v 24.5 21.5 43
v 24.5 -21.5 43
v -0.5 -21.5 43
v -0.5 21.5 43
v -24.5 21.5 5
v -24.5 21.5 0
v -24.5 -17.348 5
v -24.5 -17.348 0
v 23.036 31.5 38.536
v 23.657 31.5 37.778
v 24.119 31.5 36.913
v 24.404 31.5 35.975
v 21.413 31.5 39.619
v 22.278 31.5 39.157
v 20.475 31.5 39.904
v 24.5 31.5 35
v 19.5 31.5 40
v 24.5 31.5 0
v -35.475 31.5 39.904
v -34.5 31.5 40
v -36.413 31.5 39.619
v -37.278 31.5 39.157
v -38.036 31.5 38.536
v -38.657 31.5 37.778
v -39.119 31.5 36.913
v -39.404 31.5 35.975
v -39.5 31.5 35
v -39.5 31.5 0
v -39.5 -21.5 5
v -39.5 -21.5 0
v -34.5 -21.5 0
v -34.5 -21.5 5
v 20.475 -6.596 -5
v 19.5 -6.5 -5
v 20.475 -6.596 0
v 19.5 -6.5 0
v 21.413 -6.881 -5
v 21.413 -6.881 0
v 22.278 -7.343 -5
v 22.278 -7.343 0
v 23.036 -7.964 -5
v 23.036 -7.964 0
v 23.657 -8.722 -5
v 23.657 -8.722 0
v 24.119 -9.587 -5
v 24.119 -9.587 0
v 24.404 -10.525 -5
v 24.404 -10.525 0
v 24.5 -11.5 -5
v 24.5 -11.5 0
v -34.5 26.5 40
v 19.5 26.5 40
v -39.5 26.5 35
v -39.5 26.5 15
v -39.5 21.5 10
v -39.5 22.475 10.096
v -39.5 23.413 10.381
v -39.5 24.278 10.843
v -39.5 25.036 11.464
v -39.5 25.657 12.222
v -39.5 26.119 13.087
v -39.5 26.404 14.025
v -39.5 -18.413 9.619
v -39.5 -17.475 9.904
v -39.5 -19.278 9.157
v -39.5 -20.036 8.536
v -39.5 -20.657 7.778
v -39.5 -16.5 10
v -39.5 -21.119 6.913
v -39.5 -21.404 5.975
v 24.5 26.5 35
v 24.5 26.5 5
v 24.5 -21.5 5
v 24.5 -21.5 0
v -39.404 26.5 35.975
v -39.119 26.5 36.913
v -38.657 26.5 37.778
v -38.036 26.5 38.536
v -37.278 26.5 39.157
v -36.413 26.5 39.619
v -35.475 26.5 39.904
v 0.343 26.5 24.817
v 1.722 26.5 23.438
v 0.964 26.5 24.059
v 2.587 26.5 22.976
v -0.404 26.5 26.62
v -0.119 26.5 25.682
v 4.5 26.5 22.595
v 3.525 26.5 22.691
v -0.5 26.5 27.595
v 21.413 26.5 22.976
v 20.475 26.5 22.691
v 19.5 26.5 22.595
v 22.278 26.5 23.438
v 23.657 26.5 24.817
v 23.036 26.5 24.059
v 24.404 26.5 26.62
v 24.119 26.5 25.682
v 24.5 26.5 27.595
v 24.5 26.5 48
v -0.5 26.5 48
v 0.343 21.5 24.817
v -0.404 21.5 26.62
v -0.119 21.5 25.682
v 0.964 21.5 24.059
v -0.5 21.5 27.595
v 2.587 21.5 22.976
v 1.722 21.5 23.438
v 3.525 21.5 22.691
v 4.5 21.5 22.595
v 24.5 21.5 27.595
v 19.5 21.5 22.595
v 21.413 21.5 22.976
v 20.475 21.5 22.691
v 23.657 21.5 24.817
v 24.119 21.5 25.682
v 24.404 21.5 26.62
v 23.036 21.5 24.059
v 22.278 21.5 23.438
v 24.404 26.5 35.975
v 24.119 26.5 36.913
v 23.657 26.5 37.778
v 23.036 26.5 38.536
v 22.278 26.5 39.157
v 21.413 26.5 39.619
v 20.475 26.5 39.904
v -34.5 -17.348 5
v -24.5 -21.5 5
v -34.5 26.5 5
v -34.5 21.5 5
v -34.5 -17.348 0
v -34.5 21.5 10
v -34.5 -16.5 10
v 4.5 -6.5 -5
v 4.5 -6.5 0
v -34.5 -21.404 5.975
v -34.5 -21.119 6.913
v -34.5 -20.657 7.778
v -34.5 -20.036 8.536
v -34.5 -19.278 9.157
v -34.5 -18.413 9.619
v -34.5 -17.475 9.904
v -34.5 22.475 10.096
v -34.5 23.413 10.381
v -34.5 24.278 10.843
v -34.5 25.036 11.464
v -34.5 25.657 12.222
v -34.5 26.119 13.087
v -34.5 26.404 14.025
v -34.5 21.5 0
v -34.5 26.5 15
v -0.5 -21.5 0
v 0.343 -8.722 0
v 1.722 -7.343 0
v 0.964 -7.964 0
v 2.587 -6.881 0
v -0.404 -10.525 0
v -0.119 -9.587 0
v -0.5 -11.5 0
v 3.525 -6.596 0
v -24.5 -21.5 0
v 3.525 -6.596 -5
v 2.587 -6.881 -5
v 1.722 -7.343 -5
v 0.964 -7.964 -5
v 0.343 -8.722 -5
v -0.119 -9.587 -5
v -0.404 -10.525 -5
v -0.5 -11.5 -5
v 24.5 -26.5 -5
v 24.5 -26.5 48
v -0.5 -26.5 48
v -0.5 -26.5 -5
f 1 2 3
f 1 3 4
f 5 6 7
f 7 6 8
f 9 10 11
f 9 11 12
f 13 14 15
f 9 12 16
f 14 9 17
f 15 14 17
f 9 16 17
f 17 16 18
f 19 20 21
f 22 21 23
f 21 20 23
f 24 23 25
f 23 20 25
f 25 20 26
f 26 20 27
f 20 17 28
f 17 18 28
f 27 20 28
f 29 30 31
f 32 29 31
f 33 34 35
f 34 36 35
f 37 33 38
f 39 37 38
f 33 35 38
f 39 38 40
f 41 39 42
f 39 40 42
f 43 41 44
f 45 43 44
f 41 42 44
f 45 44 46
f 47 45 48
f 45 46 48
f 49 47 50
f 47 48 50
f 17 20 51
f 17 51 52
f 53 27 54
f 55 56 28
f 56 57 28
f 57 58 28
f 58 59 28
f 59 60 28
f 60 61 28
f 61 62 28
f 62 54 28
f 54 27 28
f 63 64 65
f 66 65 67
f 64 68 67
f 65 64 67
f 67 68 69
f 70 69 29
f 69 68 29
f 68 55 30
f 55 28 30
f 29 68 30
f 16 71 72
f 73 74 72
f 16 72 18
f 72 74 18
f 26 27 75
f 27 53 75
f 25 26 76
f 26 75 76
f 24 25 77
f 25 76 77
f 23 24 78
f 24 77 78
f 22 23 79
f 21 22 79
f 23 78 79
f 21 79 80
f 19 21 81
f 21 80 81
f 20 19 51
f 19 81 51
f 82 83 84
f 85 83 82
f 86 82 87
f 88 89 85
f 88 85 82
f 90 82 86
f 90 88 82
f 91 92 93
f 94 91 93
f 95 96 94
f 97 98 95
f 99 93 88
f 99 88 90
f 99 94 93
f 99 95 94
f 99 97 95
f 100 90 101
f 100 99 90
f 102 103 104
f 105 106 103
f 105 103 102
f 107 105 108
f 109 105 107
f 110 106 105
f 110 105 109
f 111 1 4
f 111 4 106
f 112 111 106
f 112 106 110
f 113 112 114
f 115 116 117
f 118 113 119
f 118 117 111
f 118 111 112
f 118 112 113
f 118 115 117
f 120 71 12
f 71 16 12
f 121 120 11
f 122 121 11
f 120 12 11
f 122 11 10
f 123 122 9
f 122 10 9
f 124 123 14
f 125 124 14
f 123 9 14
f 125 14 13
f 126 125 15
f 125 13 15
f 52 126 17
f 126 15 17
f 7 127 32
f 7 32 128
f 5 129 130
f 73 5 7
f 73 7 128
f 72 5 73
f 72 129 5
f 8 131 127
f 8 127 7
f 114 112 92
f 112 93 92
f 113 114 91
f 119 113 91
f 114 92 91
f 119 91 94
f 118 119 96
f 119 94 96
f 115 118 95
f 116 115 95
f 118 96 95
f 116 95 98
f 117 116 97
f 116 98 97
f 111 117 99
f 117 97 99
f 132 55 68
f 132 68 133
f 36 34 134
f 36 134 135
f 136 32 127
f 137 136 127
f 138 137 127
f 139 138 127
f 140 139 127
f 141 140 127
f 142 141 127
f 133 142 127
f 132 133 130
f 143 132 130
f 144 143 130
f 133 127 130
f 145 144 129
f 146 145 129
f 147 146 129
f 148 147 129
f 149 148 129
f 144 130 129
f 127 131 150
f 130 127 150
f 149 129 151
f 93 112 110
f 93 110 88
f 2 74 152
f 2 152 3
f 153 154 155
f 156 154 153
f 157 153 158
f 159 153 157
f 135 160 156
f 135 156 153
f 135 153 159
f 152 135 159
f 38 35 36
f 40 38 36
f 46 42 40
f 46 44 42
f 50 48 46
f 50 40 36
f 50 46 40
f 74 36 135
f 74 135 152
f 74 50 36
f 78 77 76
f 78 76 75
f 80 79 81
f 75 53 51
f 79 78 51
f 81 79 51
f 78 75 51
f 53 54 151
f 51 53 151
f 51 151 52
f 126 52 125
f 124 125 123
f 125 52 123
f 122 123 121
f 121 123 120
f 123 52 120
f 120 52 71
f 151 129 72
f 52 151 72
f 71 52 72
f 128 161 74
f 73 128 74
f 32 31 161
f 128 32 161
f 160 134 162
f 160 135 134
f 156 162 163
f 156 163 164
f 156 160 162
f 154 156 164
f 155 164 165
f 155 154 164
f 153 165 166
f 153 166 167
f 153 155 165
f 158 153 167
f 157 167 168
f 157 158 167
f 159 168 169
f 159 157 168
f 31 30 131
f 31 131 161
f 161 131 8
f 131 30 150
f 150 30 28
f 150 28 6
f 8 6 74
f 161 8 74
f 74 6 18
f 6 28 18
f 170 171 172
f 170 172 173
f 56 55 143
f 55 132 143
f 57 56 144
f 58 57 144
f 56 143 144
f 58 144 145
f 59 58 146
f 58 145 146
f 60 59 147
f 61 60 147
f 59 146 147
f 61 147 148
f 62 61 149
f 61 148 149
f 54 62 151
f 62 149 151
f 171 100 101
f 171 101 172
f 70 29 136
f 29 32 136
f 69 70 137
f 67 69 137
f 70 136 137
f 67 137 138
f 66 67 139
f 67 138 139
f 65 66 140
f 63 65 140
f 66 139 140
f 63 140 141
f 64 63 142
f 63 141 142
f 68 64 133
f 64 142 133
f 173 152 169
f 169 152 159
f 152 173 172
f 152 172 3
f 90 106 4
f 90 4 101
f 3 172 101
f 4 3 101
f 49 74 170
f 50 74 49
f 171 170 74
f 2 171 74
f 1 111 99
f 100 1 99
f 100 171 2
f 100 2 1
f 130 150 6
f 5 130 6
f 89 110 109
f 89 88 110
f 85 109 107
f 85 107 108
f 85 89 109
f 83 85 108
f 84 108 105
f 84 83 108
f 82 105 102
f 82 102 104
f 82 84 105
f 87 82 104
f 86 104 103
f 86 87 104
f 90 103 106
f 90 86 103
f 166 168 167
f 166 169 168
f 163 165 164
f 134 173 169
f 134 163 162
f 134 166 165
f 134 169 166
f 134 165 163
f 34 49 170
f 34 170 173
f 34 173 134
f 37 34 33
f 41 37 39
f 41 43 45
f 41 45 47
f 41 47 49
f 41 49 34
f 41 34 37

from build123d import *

# Parameters (mm, degrees)
F0_W     = 10
F0_H     = 4.151869
F1_DEPTH = 5
F0_W_2   = 5
F0_H_2   = 5
F2_DEPTH = 10
F3_DEPTH = 40
F4_R     = 5
F6_DEPTH = 25
F7_R     = 5


with BuildPart() as f1:
    # F0 (on Top) → F1 (new body)
    with BuildSketch(Plane.XY):
        Polygon((24.5, -21.5), (24.5, 21.5), (-24.5, 21.5), (-24.5, -17.348131), (-24.5, -21.5), align=None)
        with Locations((-29.5, -19.424065)):
            Rectangle(F0_W, F0_H)
        Polygon((-24.5, 21.5), (24.5, 21.5), (24.5, 26.5), (-34.5, 26.5), (-34.5, 21.5), align=None)
    extrude(amount=F1_DEPTH)

    # F0 (on Top) → F2 (join)
    with BuildSketch(Plane.XY):
        Polygon((-34.5, -17.348131), (-34.5, 21.5), (-39.5, 21.5), (-39.5, -21.5), (-34.5, -21.5), align=None)
        with Locations((-37, 24)):
            Rectangle(F0_W_2, F0_H_2)
    extrude(amount=F2_DEPTH)

    # F0 (on Top) → F3 (join)
    with BuildSketch(Plane.XY):
        Polygon((-34.5, 26.5), (24.5, 26.5), (24.5, 31.5), (-39.5, 31.5), (-39.5, 26.5), align=None)
    extrude(amount=F3_DEPTH)

    # F4
    f4_edges = [f1.edges().sort_by_distance(p)[0] for p in [
        (-39.5, 29, 40),
        (24.5, 29, 40),
        (-37, -21.5, 10),
        (-37, 26.5, 10),
    ]]
    fillet(f4_edges, radius=F4_R)


with BuildPart() as f6:
    # F5 (on face) → F6 (new body)
    with BuildSketch(Plane.YZ.offset(24.5)):
        Polygon((-6.5, -5), (-6.5, 0), (-21.5, 0), (-26.5, 0), (-26.5, -5), align=None)
        Polygon((-26.5, 0), (-21.5, 0), (-21.5, 5), (-21.5, 43), (-21.5, 48), (-26.5, 48), align=None)
        Polygon((-21.5, 48), (-21.5, 43), (21.5, 43), (26.5, 43), (26.5, 48), align=None)
        Polygon((26.5, 22.594964), (26.5, 35), (26.5, 43), (21.5, 43), (21.5, 22.594964), align=None)
    extrude(amount=-F6_DEPTH)

    # F7
    f7_edges = [f6.edges().sort_by_distance(p)[0] for p in [
        (24.5, 24, 22.594964),
        (-0.5, 24, 22.594964),
        (24.5, -6.5, -2.5),
        (-0.5, -6.5, -2.5),
    ]]
    fillet(f7_edges, radius=F7_R)


solid = Compound([f1.part, f6.part])
